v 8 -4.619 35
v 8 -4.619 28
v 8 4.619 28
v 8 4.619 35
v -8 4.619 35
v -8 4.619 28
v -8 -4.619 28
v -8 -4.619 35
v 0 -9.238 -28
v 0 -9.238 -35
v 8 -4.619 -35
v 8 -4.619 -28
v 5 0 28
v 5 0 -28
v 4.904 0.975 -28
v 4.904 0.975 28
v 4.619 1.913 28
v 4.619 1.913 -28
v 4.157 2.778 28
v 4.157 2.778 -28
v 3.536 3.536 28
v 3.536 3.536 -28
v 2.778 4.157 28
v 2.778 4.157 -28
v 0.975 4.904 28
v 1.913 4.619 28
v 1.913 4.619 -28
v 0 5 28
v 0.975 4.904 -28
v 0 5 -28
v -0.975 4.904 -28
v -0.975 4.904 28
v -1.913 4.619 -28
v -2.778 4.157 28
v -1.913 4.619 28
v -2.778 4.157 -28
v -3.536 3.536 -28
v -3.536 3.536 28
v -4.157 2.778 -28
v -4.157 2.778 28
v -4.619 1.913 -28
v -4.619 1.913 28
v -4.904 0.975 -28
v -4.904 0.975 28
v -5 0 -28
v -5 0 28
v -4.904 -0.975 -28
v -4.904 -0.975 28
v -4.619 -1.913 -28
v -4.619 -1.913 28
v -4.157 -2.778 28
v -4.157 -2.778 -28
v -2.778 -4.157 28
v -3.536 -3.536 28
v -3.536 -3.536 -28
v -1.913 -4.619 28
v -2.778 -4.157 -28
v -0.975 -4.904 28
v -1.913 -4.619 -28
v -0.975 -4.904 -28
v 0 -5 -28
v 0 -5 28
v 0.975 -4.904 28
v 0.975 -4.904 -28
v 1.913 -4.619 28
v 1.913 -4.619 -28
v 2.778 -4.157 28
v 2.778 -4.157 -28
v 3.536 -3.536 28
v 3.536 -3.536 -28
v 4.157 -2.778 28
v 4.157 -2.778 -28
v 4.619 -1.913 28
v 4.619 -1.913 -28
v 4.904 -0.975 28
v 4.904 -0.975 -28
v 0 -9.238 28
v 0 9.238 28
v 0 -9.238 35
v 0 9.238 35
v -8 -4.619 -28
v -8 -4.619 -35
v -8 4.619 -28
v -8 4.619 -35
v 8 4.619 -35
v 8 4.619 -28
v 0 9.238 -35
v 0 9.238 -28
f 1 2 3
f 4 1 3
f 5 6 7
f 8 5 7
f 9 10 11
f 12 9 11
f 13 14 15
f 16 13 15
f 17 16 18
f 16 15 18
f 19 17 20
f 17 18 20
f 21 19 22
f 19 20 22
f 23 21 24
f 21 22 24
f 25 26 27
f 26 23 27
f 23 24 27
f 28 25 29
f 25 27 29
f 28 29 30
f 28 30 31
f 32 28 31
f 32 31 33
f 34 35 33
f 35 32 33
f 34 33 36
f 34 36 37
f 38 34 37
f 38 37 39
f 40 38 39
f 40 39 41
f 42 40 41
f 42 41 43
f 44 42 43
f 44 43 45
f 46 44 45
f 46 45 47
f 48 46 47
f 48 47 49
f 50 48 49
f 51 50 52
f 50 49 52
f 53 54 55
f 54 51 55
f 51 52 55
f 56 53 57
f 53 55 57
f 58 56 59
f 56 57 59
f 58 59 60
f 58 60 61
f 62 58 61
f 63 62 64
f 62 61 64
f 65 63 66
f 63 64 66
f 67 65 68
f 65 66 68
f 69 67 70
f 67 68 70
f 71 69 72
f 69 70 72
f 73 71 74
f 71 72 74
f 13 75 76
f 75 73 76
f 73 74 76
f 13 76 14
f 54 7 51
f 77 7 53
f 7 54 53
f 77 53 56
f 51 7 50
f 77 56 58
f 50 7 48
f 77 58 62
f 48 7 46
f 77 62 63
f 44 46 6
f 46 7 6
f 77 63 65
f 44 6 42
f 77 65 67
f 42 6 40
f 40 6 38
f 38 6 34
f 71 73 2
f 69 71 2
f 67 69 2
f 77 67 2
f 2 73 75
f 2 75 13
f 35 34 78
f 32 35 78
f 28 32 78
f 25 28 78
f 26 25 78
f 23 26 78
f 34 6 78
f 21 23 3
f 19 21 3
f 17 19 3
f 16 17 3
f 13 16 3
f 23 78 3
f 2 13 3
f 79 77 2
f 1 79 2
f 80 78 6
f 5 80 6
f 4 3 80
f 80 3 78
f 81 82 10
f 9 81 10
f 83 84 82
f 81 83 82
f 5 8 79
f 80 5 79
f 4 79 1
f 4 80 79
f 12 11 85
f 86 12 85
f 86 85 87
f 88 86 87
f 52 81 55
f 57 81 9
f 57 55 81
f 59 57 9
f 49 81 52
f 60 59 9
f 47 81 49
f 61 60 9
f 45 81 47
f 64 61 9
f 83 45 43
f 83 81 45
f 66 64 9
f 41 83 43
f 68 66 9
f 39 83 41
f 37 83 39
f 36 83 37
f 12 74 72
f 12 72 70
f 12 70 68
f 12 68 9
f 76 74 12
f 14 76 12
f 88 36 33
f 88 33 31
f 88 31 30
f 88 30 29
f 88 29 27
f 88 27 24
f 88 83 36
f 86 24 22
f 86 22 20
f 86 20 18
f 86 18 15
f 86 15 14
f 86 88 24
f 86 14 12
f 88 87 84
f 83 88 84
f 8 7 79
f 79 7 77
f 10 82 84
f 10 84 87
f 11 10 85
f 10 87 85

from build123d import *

# Parameters (mm, degrees)
EXTRUDE_START      = -33
EXTRUDE_SKETCH_1_R = 5
EXTRUDE_1_DEPTH    = 66
EXTRUDE_START_2    = 28
EXTRUDE_2_DEPTH    = 7
EXTRUDE_START_3    = -35
EXTRUDE_3_DEPTH    = 7


with BuildPart() as part:
    # Extrude sketch 1 → Extrude 1 (new body)
    with BuildSketch(Plane.XY.offset(EXTRUDE_START)):
        Circle(EXTRUDE_SKETCH_1_R)
    extrude(amount=EXTRUDE_1_DEPTH)


with BuildPart() as body_2:
    # Extrude sketch 2 → Extrude 2 (new body)
    with BuildSketch(Plane.XY.offset(EXTRUDE_START_2)):
        Polygon((8, 4.618802154), (0, 9.237604307), (-8, 4.618802154), (-8, -4.618802154), (0, -9.237604307), (8, -4.618802154), align=None)
    extrude(amount=EXTRUDE_2_DEPTH)


with BuildPart() as body_3:
    # Extrude sketch 3 → Extrude 3 (new body)
    with BuildSketch(Plane.XY.offset(EXTRUDE_START_3)):
        Polygon((8, 4.618802154), (0, 9.237604307), (-8, 4.618802154), (-8, -4.618802154), (0, -9.237604307), (8, -4.618802154), align=None)
    extrude(amount=EXTRUDE_3_DEPTH)

    # Combine (weld / assembly of features): union body 2, part
    add(body_2.part)
    add(part.part)


solid = body_3.part
